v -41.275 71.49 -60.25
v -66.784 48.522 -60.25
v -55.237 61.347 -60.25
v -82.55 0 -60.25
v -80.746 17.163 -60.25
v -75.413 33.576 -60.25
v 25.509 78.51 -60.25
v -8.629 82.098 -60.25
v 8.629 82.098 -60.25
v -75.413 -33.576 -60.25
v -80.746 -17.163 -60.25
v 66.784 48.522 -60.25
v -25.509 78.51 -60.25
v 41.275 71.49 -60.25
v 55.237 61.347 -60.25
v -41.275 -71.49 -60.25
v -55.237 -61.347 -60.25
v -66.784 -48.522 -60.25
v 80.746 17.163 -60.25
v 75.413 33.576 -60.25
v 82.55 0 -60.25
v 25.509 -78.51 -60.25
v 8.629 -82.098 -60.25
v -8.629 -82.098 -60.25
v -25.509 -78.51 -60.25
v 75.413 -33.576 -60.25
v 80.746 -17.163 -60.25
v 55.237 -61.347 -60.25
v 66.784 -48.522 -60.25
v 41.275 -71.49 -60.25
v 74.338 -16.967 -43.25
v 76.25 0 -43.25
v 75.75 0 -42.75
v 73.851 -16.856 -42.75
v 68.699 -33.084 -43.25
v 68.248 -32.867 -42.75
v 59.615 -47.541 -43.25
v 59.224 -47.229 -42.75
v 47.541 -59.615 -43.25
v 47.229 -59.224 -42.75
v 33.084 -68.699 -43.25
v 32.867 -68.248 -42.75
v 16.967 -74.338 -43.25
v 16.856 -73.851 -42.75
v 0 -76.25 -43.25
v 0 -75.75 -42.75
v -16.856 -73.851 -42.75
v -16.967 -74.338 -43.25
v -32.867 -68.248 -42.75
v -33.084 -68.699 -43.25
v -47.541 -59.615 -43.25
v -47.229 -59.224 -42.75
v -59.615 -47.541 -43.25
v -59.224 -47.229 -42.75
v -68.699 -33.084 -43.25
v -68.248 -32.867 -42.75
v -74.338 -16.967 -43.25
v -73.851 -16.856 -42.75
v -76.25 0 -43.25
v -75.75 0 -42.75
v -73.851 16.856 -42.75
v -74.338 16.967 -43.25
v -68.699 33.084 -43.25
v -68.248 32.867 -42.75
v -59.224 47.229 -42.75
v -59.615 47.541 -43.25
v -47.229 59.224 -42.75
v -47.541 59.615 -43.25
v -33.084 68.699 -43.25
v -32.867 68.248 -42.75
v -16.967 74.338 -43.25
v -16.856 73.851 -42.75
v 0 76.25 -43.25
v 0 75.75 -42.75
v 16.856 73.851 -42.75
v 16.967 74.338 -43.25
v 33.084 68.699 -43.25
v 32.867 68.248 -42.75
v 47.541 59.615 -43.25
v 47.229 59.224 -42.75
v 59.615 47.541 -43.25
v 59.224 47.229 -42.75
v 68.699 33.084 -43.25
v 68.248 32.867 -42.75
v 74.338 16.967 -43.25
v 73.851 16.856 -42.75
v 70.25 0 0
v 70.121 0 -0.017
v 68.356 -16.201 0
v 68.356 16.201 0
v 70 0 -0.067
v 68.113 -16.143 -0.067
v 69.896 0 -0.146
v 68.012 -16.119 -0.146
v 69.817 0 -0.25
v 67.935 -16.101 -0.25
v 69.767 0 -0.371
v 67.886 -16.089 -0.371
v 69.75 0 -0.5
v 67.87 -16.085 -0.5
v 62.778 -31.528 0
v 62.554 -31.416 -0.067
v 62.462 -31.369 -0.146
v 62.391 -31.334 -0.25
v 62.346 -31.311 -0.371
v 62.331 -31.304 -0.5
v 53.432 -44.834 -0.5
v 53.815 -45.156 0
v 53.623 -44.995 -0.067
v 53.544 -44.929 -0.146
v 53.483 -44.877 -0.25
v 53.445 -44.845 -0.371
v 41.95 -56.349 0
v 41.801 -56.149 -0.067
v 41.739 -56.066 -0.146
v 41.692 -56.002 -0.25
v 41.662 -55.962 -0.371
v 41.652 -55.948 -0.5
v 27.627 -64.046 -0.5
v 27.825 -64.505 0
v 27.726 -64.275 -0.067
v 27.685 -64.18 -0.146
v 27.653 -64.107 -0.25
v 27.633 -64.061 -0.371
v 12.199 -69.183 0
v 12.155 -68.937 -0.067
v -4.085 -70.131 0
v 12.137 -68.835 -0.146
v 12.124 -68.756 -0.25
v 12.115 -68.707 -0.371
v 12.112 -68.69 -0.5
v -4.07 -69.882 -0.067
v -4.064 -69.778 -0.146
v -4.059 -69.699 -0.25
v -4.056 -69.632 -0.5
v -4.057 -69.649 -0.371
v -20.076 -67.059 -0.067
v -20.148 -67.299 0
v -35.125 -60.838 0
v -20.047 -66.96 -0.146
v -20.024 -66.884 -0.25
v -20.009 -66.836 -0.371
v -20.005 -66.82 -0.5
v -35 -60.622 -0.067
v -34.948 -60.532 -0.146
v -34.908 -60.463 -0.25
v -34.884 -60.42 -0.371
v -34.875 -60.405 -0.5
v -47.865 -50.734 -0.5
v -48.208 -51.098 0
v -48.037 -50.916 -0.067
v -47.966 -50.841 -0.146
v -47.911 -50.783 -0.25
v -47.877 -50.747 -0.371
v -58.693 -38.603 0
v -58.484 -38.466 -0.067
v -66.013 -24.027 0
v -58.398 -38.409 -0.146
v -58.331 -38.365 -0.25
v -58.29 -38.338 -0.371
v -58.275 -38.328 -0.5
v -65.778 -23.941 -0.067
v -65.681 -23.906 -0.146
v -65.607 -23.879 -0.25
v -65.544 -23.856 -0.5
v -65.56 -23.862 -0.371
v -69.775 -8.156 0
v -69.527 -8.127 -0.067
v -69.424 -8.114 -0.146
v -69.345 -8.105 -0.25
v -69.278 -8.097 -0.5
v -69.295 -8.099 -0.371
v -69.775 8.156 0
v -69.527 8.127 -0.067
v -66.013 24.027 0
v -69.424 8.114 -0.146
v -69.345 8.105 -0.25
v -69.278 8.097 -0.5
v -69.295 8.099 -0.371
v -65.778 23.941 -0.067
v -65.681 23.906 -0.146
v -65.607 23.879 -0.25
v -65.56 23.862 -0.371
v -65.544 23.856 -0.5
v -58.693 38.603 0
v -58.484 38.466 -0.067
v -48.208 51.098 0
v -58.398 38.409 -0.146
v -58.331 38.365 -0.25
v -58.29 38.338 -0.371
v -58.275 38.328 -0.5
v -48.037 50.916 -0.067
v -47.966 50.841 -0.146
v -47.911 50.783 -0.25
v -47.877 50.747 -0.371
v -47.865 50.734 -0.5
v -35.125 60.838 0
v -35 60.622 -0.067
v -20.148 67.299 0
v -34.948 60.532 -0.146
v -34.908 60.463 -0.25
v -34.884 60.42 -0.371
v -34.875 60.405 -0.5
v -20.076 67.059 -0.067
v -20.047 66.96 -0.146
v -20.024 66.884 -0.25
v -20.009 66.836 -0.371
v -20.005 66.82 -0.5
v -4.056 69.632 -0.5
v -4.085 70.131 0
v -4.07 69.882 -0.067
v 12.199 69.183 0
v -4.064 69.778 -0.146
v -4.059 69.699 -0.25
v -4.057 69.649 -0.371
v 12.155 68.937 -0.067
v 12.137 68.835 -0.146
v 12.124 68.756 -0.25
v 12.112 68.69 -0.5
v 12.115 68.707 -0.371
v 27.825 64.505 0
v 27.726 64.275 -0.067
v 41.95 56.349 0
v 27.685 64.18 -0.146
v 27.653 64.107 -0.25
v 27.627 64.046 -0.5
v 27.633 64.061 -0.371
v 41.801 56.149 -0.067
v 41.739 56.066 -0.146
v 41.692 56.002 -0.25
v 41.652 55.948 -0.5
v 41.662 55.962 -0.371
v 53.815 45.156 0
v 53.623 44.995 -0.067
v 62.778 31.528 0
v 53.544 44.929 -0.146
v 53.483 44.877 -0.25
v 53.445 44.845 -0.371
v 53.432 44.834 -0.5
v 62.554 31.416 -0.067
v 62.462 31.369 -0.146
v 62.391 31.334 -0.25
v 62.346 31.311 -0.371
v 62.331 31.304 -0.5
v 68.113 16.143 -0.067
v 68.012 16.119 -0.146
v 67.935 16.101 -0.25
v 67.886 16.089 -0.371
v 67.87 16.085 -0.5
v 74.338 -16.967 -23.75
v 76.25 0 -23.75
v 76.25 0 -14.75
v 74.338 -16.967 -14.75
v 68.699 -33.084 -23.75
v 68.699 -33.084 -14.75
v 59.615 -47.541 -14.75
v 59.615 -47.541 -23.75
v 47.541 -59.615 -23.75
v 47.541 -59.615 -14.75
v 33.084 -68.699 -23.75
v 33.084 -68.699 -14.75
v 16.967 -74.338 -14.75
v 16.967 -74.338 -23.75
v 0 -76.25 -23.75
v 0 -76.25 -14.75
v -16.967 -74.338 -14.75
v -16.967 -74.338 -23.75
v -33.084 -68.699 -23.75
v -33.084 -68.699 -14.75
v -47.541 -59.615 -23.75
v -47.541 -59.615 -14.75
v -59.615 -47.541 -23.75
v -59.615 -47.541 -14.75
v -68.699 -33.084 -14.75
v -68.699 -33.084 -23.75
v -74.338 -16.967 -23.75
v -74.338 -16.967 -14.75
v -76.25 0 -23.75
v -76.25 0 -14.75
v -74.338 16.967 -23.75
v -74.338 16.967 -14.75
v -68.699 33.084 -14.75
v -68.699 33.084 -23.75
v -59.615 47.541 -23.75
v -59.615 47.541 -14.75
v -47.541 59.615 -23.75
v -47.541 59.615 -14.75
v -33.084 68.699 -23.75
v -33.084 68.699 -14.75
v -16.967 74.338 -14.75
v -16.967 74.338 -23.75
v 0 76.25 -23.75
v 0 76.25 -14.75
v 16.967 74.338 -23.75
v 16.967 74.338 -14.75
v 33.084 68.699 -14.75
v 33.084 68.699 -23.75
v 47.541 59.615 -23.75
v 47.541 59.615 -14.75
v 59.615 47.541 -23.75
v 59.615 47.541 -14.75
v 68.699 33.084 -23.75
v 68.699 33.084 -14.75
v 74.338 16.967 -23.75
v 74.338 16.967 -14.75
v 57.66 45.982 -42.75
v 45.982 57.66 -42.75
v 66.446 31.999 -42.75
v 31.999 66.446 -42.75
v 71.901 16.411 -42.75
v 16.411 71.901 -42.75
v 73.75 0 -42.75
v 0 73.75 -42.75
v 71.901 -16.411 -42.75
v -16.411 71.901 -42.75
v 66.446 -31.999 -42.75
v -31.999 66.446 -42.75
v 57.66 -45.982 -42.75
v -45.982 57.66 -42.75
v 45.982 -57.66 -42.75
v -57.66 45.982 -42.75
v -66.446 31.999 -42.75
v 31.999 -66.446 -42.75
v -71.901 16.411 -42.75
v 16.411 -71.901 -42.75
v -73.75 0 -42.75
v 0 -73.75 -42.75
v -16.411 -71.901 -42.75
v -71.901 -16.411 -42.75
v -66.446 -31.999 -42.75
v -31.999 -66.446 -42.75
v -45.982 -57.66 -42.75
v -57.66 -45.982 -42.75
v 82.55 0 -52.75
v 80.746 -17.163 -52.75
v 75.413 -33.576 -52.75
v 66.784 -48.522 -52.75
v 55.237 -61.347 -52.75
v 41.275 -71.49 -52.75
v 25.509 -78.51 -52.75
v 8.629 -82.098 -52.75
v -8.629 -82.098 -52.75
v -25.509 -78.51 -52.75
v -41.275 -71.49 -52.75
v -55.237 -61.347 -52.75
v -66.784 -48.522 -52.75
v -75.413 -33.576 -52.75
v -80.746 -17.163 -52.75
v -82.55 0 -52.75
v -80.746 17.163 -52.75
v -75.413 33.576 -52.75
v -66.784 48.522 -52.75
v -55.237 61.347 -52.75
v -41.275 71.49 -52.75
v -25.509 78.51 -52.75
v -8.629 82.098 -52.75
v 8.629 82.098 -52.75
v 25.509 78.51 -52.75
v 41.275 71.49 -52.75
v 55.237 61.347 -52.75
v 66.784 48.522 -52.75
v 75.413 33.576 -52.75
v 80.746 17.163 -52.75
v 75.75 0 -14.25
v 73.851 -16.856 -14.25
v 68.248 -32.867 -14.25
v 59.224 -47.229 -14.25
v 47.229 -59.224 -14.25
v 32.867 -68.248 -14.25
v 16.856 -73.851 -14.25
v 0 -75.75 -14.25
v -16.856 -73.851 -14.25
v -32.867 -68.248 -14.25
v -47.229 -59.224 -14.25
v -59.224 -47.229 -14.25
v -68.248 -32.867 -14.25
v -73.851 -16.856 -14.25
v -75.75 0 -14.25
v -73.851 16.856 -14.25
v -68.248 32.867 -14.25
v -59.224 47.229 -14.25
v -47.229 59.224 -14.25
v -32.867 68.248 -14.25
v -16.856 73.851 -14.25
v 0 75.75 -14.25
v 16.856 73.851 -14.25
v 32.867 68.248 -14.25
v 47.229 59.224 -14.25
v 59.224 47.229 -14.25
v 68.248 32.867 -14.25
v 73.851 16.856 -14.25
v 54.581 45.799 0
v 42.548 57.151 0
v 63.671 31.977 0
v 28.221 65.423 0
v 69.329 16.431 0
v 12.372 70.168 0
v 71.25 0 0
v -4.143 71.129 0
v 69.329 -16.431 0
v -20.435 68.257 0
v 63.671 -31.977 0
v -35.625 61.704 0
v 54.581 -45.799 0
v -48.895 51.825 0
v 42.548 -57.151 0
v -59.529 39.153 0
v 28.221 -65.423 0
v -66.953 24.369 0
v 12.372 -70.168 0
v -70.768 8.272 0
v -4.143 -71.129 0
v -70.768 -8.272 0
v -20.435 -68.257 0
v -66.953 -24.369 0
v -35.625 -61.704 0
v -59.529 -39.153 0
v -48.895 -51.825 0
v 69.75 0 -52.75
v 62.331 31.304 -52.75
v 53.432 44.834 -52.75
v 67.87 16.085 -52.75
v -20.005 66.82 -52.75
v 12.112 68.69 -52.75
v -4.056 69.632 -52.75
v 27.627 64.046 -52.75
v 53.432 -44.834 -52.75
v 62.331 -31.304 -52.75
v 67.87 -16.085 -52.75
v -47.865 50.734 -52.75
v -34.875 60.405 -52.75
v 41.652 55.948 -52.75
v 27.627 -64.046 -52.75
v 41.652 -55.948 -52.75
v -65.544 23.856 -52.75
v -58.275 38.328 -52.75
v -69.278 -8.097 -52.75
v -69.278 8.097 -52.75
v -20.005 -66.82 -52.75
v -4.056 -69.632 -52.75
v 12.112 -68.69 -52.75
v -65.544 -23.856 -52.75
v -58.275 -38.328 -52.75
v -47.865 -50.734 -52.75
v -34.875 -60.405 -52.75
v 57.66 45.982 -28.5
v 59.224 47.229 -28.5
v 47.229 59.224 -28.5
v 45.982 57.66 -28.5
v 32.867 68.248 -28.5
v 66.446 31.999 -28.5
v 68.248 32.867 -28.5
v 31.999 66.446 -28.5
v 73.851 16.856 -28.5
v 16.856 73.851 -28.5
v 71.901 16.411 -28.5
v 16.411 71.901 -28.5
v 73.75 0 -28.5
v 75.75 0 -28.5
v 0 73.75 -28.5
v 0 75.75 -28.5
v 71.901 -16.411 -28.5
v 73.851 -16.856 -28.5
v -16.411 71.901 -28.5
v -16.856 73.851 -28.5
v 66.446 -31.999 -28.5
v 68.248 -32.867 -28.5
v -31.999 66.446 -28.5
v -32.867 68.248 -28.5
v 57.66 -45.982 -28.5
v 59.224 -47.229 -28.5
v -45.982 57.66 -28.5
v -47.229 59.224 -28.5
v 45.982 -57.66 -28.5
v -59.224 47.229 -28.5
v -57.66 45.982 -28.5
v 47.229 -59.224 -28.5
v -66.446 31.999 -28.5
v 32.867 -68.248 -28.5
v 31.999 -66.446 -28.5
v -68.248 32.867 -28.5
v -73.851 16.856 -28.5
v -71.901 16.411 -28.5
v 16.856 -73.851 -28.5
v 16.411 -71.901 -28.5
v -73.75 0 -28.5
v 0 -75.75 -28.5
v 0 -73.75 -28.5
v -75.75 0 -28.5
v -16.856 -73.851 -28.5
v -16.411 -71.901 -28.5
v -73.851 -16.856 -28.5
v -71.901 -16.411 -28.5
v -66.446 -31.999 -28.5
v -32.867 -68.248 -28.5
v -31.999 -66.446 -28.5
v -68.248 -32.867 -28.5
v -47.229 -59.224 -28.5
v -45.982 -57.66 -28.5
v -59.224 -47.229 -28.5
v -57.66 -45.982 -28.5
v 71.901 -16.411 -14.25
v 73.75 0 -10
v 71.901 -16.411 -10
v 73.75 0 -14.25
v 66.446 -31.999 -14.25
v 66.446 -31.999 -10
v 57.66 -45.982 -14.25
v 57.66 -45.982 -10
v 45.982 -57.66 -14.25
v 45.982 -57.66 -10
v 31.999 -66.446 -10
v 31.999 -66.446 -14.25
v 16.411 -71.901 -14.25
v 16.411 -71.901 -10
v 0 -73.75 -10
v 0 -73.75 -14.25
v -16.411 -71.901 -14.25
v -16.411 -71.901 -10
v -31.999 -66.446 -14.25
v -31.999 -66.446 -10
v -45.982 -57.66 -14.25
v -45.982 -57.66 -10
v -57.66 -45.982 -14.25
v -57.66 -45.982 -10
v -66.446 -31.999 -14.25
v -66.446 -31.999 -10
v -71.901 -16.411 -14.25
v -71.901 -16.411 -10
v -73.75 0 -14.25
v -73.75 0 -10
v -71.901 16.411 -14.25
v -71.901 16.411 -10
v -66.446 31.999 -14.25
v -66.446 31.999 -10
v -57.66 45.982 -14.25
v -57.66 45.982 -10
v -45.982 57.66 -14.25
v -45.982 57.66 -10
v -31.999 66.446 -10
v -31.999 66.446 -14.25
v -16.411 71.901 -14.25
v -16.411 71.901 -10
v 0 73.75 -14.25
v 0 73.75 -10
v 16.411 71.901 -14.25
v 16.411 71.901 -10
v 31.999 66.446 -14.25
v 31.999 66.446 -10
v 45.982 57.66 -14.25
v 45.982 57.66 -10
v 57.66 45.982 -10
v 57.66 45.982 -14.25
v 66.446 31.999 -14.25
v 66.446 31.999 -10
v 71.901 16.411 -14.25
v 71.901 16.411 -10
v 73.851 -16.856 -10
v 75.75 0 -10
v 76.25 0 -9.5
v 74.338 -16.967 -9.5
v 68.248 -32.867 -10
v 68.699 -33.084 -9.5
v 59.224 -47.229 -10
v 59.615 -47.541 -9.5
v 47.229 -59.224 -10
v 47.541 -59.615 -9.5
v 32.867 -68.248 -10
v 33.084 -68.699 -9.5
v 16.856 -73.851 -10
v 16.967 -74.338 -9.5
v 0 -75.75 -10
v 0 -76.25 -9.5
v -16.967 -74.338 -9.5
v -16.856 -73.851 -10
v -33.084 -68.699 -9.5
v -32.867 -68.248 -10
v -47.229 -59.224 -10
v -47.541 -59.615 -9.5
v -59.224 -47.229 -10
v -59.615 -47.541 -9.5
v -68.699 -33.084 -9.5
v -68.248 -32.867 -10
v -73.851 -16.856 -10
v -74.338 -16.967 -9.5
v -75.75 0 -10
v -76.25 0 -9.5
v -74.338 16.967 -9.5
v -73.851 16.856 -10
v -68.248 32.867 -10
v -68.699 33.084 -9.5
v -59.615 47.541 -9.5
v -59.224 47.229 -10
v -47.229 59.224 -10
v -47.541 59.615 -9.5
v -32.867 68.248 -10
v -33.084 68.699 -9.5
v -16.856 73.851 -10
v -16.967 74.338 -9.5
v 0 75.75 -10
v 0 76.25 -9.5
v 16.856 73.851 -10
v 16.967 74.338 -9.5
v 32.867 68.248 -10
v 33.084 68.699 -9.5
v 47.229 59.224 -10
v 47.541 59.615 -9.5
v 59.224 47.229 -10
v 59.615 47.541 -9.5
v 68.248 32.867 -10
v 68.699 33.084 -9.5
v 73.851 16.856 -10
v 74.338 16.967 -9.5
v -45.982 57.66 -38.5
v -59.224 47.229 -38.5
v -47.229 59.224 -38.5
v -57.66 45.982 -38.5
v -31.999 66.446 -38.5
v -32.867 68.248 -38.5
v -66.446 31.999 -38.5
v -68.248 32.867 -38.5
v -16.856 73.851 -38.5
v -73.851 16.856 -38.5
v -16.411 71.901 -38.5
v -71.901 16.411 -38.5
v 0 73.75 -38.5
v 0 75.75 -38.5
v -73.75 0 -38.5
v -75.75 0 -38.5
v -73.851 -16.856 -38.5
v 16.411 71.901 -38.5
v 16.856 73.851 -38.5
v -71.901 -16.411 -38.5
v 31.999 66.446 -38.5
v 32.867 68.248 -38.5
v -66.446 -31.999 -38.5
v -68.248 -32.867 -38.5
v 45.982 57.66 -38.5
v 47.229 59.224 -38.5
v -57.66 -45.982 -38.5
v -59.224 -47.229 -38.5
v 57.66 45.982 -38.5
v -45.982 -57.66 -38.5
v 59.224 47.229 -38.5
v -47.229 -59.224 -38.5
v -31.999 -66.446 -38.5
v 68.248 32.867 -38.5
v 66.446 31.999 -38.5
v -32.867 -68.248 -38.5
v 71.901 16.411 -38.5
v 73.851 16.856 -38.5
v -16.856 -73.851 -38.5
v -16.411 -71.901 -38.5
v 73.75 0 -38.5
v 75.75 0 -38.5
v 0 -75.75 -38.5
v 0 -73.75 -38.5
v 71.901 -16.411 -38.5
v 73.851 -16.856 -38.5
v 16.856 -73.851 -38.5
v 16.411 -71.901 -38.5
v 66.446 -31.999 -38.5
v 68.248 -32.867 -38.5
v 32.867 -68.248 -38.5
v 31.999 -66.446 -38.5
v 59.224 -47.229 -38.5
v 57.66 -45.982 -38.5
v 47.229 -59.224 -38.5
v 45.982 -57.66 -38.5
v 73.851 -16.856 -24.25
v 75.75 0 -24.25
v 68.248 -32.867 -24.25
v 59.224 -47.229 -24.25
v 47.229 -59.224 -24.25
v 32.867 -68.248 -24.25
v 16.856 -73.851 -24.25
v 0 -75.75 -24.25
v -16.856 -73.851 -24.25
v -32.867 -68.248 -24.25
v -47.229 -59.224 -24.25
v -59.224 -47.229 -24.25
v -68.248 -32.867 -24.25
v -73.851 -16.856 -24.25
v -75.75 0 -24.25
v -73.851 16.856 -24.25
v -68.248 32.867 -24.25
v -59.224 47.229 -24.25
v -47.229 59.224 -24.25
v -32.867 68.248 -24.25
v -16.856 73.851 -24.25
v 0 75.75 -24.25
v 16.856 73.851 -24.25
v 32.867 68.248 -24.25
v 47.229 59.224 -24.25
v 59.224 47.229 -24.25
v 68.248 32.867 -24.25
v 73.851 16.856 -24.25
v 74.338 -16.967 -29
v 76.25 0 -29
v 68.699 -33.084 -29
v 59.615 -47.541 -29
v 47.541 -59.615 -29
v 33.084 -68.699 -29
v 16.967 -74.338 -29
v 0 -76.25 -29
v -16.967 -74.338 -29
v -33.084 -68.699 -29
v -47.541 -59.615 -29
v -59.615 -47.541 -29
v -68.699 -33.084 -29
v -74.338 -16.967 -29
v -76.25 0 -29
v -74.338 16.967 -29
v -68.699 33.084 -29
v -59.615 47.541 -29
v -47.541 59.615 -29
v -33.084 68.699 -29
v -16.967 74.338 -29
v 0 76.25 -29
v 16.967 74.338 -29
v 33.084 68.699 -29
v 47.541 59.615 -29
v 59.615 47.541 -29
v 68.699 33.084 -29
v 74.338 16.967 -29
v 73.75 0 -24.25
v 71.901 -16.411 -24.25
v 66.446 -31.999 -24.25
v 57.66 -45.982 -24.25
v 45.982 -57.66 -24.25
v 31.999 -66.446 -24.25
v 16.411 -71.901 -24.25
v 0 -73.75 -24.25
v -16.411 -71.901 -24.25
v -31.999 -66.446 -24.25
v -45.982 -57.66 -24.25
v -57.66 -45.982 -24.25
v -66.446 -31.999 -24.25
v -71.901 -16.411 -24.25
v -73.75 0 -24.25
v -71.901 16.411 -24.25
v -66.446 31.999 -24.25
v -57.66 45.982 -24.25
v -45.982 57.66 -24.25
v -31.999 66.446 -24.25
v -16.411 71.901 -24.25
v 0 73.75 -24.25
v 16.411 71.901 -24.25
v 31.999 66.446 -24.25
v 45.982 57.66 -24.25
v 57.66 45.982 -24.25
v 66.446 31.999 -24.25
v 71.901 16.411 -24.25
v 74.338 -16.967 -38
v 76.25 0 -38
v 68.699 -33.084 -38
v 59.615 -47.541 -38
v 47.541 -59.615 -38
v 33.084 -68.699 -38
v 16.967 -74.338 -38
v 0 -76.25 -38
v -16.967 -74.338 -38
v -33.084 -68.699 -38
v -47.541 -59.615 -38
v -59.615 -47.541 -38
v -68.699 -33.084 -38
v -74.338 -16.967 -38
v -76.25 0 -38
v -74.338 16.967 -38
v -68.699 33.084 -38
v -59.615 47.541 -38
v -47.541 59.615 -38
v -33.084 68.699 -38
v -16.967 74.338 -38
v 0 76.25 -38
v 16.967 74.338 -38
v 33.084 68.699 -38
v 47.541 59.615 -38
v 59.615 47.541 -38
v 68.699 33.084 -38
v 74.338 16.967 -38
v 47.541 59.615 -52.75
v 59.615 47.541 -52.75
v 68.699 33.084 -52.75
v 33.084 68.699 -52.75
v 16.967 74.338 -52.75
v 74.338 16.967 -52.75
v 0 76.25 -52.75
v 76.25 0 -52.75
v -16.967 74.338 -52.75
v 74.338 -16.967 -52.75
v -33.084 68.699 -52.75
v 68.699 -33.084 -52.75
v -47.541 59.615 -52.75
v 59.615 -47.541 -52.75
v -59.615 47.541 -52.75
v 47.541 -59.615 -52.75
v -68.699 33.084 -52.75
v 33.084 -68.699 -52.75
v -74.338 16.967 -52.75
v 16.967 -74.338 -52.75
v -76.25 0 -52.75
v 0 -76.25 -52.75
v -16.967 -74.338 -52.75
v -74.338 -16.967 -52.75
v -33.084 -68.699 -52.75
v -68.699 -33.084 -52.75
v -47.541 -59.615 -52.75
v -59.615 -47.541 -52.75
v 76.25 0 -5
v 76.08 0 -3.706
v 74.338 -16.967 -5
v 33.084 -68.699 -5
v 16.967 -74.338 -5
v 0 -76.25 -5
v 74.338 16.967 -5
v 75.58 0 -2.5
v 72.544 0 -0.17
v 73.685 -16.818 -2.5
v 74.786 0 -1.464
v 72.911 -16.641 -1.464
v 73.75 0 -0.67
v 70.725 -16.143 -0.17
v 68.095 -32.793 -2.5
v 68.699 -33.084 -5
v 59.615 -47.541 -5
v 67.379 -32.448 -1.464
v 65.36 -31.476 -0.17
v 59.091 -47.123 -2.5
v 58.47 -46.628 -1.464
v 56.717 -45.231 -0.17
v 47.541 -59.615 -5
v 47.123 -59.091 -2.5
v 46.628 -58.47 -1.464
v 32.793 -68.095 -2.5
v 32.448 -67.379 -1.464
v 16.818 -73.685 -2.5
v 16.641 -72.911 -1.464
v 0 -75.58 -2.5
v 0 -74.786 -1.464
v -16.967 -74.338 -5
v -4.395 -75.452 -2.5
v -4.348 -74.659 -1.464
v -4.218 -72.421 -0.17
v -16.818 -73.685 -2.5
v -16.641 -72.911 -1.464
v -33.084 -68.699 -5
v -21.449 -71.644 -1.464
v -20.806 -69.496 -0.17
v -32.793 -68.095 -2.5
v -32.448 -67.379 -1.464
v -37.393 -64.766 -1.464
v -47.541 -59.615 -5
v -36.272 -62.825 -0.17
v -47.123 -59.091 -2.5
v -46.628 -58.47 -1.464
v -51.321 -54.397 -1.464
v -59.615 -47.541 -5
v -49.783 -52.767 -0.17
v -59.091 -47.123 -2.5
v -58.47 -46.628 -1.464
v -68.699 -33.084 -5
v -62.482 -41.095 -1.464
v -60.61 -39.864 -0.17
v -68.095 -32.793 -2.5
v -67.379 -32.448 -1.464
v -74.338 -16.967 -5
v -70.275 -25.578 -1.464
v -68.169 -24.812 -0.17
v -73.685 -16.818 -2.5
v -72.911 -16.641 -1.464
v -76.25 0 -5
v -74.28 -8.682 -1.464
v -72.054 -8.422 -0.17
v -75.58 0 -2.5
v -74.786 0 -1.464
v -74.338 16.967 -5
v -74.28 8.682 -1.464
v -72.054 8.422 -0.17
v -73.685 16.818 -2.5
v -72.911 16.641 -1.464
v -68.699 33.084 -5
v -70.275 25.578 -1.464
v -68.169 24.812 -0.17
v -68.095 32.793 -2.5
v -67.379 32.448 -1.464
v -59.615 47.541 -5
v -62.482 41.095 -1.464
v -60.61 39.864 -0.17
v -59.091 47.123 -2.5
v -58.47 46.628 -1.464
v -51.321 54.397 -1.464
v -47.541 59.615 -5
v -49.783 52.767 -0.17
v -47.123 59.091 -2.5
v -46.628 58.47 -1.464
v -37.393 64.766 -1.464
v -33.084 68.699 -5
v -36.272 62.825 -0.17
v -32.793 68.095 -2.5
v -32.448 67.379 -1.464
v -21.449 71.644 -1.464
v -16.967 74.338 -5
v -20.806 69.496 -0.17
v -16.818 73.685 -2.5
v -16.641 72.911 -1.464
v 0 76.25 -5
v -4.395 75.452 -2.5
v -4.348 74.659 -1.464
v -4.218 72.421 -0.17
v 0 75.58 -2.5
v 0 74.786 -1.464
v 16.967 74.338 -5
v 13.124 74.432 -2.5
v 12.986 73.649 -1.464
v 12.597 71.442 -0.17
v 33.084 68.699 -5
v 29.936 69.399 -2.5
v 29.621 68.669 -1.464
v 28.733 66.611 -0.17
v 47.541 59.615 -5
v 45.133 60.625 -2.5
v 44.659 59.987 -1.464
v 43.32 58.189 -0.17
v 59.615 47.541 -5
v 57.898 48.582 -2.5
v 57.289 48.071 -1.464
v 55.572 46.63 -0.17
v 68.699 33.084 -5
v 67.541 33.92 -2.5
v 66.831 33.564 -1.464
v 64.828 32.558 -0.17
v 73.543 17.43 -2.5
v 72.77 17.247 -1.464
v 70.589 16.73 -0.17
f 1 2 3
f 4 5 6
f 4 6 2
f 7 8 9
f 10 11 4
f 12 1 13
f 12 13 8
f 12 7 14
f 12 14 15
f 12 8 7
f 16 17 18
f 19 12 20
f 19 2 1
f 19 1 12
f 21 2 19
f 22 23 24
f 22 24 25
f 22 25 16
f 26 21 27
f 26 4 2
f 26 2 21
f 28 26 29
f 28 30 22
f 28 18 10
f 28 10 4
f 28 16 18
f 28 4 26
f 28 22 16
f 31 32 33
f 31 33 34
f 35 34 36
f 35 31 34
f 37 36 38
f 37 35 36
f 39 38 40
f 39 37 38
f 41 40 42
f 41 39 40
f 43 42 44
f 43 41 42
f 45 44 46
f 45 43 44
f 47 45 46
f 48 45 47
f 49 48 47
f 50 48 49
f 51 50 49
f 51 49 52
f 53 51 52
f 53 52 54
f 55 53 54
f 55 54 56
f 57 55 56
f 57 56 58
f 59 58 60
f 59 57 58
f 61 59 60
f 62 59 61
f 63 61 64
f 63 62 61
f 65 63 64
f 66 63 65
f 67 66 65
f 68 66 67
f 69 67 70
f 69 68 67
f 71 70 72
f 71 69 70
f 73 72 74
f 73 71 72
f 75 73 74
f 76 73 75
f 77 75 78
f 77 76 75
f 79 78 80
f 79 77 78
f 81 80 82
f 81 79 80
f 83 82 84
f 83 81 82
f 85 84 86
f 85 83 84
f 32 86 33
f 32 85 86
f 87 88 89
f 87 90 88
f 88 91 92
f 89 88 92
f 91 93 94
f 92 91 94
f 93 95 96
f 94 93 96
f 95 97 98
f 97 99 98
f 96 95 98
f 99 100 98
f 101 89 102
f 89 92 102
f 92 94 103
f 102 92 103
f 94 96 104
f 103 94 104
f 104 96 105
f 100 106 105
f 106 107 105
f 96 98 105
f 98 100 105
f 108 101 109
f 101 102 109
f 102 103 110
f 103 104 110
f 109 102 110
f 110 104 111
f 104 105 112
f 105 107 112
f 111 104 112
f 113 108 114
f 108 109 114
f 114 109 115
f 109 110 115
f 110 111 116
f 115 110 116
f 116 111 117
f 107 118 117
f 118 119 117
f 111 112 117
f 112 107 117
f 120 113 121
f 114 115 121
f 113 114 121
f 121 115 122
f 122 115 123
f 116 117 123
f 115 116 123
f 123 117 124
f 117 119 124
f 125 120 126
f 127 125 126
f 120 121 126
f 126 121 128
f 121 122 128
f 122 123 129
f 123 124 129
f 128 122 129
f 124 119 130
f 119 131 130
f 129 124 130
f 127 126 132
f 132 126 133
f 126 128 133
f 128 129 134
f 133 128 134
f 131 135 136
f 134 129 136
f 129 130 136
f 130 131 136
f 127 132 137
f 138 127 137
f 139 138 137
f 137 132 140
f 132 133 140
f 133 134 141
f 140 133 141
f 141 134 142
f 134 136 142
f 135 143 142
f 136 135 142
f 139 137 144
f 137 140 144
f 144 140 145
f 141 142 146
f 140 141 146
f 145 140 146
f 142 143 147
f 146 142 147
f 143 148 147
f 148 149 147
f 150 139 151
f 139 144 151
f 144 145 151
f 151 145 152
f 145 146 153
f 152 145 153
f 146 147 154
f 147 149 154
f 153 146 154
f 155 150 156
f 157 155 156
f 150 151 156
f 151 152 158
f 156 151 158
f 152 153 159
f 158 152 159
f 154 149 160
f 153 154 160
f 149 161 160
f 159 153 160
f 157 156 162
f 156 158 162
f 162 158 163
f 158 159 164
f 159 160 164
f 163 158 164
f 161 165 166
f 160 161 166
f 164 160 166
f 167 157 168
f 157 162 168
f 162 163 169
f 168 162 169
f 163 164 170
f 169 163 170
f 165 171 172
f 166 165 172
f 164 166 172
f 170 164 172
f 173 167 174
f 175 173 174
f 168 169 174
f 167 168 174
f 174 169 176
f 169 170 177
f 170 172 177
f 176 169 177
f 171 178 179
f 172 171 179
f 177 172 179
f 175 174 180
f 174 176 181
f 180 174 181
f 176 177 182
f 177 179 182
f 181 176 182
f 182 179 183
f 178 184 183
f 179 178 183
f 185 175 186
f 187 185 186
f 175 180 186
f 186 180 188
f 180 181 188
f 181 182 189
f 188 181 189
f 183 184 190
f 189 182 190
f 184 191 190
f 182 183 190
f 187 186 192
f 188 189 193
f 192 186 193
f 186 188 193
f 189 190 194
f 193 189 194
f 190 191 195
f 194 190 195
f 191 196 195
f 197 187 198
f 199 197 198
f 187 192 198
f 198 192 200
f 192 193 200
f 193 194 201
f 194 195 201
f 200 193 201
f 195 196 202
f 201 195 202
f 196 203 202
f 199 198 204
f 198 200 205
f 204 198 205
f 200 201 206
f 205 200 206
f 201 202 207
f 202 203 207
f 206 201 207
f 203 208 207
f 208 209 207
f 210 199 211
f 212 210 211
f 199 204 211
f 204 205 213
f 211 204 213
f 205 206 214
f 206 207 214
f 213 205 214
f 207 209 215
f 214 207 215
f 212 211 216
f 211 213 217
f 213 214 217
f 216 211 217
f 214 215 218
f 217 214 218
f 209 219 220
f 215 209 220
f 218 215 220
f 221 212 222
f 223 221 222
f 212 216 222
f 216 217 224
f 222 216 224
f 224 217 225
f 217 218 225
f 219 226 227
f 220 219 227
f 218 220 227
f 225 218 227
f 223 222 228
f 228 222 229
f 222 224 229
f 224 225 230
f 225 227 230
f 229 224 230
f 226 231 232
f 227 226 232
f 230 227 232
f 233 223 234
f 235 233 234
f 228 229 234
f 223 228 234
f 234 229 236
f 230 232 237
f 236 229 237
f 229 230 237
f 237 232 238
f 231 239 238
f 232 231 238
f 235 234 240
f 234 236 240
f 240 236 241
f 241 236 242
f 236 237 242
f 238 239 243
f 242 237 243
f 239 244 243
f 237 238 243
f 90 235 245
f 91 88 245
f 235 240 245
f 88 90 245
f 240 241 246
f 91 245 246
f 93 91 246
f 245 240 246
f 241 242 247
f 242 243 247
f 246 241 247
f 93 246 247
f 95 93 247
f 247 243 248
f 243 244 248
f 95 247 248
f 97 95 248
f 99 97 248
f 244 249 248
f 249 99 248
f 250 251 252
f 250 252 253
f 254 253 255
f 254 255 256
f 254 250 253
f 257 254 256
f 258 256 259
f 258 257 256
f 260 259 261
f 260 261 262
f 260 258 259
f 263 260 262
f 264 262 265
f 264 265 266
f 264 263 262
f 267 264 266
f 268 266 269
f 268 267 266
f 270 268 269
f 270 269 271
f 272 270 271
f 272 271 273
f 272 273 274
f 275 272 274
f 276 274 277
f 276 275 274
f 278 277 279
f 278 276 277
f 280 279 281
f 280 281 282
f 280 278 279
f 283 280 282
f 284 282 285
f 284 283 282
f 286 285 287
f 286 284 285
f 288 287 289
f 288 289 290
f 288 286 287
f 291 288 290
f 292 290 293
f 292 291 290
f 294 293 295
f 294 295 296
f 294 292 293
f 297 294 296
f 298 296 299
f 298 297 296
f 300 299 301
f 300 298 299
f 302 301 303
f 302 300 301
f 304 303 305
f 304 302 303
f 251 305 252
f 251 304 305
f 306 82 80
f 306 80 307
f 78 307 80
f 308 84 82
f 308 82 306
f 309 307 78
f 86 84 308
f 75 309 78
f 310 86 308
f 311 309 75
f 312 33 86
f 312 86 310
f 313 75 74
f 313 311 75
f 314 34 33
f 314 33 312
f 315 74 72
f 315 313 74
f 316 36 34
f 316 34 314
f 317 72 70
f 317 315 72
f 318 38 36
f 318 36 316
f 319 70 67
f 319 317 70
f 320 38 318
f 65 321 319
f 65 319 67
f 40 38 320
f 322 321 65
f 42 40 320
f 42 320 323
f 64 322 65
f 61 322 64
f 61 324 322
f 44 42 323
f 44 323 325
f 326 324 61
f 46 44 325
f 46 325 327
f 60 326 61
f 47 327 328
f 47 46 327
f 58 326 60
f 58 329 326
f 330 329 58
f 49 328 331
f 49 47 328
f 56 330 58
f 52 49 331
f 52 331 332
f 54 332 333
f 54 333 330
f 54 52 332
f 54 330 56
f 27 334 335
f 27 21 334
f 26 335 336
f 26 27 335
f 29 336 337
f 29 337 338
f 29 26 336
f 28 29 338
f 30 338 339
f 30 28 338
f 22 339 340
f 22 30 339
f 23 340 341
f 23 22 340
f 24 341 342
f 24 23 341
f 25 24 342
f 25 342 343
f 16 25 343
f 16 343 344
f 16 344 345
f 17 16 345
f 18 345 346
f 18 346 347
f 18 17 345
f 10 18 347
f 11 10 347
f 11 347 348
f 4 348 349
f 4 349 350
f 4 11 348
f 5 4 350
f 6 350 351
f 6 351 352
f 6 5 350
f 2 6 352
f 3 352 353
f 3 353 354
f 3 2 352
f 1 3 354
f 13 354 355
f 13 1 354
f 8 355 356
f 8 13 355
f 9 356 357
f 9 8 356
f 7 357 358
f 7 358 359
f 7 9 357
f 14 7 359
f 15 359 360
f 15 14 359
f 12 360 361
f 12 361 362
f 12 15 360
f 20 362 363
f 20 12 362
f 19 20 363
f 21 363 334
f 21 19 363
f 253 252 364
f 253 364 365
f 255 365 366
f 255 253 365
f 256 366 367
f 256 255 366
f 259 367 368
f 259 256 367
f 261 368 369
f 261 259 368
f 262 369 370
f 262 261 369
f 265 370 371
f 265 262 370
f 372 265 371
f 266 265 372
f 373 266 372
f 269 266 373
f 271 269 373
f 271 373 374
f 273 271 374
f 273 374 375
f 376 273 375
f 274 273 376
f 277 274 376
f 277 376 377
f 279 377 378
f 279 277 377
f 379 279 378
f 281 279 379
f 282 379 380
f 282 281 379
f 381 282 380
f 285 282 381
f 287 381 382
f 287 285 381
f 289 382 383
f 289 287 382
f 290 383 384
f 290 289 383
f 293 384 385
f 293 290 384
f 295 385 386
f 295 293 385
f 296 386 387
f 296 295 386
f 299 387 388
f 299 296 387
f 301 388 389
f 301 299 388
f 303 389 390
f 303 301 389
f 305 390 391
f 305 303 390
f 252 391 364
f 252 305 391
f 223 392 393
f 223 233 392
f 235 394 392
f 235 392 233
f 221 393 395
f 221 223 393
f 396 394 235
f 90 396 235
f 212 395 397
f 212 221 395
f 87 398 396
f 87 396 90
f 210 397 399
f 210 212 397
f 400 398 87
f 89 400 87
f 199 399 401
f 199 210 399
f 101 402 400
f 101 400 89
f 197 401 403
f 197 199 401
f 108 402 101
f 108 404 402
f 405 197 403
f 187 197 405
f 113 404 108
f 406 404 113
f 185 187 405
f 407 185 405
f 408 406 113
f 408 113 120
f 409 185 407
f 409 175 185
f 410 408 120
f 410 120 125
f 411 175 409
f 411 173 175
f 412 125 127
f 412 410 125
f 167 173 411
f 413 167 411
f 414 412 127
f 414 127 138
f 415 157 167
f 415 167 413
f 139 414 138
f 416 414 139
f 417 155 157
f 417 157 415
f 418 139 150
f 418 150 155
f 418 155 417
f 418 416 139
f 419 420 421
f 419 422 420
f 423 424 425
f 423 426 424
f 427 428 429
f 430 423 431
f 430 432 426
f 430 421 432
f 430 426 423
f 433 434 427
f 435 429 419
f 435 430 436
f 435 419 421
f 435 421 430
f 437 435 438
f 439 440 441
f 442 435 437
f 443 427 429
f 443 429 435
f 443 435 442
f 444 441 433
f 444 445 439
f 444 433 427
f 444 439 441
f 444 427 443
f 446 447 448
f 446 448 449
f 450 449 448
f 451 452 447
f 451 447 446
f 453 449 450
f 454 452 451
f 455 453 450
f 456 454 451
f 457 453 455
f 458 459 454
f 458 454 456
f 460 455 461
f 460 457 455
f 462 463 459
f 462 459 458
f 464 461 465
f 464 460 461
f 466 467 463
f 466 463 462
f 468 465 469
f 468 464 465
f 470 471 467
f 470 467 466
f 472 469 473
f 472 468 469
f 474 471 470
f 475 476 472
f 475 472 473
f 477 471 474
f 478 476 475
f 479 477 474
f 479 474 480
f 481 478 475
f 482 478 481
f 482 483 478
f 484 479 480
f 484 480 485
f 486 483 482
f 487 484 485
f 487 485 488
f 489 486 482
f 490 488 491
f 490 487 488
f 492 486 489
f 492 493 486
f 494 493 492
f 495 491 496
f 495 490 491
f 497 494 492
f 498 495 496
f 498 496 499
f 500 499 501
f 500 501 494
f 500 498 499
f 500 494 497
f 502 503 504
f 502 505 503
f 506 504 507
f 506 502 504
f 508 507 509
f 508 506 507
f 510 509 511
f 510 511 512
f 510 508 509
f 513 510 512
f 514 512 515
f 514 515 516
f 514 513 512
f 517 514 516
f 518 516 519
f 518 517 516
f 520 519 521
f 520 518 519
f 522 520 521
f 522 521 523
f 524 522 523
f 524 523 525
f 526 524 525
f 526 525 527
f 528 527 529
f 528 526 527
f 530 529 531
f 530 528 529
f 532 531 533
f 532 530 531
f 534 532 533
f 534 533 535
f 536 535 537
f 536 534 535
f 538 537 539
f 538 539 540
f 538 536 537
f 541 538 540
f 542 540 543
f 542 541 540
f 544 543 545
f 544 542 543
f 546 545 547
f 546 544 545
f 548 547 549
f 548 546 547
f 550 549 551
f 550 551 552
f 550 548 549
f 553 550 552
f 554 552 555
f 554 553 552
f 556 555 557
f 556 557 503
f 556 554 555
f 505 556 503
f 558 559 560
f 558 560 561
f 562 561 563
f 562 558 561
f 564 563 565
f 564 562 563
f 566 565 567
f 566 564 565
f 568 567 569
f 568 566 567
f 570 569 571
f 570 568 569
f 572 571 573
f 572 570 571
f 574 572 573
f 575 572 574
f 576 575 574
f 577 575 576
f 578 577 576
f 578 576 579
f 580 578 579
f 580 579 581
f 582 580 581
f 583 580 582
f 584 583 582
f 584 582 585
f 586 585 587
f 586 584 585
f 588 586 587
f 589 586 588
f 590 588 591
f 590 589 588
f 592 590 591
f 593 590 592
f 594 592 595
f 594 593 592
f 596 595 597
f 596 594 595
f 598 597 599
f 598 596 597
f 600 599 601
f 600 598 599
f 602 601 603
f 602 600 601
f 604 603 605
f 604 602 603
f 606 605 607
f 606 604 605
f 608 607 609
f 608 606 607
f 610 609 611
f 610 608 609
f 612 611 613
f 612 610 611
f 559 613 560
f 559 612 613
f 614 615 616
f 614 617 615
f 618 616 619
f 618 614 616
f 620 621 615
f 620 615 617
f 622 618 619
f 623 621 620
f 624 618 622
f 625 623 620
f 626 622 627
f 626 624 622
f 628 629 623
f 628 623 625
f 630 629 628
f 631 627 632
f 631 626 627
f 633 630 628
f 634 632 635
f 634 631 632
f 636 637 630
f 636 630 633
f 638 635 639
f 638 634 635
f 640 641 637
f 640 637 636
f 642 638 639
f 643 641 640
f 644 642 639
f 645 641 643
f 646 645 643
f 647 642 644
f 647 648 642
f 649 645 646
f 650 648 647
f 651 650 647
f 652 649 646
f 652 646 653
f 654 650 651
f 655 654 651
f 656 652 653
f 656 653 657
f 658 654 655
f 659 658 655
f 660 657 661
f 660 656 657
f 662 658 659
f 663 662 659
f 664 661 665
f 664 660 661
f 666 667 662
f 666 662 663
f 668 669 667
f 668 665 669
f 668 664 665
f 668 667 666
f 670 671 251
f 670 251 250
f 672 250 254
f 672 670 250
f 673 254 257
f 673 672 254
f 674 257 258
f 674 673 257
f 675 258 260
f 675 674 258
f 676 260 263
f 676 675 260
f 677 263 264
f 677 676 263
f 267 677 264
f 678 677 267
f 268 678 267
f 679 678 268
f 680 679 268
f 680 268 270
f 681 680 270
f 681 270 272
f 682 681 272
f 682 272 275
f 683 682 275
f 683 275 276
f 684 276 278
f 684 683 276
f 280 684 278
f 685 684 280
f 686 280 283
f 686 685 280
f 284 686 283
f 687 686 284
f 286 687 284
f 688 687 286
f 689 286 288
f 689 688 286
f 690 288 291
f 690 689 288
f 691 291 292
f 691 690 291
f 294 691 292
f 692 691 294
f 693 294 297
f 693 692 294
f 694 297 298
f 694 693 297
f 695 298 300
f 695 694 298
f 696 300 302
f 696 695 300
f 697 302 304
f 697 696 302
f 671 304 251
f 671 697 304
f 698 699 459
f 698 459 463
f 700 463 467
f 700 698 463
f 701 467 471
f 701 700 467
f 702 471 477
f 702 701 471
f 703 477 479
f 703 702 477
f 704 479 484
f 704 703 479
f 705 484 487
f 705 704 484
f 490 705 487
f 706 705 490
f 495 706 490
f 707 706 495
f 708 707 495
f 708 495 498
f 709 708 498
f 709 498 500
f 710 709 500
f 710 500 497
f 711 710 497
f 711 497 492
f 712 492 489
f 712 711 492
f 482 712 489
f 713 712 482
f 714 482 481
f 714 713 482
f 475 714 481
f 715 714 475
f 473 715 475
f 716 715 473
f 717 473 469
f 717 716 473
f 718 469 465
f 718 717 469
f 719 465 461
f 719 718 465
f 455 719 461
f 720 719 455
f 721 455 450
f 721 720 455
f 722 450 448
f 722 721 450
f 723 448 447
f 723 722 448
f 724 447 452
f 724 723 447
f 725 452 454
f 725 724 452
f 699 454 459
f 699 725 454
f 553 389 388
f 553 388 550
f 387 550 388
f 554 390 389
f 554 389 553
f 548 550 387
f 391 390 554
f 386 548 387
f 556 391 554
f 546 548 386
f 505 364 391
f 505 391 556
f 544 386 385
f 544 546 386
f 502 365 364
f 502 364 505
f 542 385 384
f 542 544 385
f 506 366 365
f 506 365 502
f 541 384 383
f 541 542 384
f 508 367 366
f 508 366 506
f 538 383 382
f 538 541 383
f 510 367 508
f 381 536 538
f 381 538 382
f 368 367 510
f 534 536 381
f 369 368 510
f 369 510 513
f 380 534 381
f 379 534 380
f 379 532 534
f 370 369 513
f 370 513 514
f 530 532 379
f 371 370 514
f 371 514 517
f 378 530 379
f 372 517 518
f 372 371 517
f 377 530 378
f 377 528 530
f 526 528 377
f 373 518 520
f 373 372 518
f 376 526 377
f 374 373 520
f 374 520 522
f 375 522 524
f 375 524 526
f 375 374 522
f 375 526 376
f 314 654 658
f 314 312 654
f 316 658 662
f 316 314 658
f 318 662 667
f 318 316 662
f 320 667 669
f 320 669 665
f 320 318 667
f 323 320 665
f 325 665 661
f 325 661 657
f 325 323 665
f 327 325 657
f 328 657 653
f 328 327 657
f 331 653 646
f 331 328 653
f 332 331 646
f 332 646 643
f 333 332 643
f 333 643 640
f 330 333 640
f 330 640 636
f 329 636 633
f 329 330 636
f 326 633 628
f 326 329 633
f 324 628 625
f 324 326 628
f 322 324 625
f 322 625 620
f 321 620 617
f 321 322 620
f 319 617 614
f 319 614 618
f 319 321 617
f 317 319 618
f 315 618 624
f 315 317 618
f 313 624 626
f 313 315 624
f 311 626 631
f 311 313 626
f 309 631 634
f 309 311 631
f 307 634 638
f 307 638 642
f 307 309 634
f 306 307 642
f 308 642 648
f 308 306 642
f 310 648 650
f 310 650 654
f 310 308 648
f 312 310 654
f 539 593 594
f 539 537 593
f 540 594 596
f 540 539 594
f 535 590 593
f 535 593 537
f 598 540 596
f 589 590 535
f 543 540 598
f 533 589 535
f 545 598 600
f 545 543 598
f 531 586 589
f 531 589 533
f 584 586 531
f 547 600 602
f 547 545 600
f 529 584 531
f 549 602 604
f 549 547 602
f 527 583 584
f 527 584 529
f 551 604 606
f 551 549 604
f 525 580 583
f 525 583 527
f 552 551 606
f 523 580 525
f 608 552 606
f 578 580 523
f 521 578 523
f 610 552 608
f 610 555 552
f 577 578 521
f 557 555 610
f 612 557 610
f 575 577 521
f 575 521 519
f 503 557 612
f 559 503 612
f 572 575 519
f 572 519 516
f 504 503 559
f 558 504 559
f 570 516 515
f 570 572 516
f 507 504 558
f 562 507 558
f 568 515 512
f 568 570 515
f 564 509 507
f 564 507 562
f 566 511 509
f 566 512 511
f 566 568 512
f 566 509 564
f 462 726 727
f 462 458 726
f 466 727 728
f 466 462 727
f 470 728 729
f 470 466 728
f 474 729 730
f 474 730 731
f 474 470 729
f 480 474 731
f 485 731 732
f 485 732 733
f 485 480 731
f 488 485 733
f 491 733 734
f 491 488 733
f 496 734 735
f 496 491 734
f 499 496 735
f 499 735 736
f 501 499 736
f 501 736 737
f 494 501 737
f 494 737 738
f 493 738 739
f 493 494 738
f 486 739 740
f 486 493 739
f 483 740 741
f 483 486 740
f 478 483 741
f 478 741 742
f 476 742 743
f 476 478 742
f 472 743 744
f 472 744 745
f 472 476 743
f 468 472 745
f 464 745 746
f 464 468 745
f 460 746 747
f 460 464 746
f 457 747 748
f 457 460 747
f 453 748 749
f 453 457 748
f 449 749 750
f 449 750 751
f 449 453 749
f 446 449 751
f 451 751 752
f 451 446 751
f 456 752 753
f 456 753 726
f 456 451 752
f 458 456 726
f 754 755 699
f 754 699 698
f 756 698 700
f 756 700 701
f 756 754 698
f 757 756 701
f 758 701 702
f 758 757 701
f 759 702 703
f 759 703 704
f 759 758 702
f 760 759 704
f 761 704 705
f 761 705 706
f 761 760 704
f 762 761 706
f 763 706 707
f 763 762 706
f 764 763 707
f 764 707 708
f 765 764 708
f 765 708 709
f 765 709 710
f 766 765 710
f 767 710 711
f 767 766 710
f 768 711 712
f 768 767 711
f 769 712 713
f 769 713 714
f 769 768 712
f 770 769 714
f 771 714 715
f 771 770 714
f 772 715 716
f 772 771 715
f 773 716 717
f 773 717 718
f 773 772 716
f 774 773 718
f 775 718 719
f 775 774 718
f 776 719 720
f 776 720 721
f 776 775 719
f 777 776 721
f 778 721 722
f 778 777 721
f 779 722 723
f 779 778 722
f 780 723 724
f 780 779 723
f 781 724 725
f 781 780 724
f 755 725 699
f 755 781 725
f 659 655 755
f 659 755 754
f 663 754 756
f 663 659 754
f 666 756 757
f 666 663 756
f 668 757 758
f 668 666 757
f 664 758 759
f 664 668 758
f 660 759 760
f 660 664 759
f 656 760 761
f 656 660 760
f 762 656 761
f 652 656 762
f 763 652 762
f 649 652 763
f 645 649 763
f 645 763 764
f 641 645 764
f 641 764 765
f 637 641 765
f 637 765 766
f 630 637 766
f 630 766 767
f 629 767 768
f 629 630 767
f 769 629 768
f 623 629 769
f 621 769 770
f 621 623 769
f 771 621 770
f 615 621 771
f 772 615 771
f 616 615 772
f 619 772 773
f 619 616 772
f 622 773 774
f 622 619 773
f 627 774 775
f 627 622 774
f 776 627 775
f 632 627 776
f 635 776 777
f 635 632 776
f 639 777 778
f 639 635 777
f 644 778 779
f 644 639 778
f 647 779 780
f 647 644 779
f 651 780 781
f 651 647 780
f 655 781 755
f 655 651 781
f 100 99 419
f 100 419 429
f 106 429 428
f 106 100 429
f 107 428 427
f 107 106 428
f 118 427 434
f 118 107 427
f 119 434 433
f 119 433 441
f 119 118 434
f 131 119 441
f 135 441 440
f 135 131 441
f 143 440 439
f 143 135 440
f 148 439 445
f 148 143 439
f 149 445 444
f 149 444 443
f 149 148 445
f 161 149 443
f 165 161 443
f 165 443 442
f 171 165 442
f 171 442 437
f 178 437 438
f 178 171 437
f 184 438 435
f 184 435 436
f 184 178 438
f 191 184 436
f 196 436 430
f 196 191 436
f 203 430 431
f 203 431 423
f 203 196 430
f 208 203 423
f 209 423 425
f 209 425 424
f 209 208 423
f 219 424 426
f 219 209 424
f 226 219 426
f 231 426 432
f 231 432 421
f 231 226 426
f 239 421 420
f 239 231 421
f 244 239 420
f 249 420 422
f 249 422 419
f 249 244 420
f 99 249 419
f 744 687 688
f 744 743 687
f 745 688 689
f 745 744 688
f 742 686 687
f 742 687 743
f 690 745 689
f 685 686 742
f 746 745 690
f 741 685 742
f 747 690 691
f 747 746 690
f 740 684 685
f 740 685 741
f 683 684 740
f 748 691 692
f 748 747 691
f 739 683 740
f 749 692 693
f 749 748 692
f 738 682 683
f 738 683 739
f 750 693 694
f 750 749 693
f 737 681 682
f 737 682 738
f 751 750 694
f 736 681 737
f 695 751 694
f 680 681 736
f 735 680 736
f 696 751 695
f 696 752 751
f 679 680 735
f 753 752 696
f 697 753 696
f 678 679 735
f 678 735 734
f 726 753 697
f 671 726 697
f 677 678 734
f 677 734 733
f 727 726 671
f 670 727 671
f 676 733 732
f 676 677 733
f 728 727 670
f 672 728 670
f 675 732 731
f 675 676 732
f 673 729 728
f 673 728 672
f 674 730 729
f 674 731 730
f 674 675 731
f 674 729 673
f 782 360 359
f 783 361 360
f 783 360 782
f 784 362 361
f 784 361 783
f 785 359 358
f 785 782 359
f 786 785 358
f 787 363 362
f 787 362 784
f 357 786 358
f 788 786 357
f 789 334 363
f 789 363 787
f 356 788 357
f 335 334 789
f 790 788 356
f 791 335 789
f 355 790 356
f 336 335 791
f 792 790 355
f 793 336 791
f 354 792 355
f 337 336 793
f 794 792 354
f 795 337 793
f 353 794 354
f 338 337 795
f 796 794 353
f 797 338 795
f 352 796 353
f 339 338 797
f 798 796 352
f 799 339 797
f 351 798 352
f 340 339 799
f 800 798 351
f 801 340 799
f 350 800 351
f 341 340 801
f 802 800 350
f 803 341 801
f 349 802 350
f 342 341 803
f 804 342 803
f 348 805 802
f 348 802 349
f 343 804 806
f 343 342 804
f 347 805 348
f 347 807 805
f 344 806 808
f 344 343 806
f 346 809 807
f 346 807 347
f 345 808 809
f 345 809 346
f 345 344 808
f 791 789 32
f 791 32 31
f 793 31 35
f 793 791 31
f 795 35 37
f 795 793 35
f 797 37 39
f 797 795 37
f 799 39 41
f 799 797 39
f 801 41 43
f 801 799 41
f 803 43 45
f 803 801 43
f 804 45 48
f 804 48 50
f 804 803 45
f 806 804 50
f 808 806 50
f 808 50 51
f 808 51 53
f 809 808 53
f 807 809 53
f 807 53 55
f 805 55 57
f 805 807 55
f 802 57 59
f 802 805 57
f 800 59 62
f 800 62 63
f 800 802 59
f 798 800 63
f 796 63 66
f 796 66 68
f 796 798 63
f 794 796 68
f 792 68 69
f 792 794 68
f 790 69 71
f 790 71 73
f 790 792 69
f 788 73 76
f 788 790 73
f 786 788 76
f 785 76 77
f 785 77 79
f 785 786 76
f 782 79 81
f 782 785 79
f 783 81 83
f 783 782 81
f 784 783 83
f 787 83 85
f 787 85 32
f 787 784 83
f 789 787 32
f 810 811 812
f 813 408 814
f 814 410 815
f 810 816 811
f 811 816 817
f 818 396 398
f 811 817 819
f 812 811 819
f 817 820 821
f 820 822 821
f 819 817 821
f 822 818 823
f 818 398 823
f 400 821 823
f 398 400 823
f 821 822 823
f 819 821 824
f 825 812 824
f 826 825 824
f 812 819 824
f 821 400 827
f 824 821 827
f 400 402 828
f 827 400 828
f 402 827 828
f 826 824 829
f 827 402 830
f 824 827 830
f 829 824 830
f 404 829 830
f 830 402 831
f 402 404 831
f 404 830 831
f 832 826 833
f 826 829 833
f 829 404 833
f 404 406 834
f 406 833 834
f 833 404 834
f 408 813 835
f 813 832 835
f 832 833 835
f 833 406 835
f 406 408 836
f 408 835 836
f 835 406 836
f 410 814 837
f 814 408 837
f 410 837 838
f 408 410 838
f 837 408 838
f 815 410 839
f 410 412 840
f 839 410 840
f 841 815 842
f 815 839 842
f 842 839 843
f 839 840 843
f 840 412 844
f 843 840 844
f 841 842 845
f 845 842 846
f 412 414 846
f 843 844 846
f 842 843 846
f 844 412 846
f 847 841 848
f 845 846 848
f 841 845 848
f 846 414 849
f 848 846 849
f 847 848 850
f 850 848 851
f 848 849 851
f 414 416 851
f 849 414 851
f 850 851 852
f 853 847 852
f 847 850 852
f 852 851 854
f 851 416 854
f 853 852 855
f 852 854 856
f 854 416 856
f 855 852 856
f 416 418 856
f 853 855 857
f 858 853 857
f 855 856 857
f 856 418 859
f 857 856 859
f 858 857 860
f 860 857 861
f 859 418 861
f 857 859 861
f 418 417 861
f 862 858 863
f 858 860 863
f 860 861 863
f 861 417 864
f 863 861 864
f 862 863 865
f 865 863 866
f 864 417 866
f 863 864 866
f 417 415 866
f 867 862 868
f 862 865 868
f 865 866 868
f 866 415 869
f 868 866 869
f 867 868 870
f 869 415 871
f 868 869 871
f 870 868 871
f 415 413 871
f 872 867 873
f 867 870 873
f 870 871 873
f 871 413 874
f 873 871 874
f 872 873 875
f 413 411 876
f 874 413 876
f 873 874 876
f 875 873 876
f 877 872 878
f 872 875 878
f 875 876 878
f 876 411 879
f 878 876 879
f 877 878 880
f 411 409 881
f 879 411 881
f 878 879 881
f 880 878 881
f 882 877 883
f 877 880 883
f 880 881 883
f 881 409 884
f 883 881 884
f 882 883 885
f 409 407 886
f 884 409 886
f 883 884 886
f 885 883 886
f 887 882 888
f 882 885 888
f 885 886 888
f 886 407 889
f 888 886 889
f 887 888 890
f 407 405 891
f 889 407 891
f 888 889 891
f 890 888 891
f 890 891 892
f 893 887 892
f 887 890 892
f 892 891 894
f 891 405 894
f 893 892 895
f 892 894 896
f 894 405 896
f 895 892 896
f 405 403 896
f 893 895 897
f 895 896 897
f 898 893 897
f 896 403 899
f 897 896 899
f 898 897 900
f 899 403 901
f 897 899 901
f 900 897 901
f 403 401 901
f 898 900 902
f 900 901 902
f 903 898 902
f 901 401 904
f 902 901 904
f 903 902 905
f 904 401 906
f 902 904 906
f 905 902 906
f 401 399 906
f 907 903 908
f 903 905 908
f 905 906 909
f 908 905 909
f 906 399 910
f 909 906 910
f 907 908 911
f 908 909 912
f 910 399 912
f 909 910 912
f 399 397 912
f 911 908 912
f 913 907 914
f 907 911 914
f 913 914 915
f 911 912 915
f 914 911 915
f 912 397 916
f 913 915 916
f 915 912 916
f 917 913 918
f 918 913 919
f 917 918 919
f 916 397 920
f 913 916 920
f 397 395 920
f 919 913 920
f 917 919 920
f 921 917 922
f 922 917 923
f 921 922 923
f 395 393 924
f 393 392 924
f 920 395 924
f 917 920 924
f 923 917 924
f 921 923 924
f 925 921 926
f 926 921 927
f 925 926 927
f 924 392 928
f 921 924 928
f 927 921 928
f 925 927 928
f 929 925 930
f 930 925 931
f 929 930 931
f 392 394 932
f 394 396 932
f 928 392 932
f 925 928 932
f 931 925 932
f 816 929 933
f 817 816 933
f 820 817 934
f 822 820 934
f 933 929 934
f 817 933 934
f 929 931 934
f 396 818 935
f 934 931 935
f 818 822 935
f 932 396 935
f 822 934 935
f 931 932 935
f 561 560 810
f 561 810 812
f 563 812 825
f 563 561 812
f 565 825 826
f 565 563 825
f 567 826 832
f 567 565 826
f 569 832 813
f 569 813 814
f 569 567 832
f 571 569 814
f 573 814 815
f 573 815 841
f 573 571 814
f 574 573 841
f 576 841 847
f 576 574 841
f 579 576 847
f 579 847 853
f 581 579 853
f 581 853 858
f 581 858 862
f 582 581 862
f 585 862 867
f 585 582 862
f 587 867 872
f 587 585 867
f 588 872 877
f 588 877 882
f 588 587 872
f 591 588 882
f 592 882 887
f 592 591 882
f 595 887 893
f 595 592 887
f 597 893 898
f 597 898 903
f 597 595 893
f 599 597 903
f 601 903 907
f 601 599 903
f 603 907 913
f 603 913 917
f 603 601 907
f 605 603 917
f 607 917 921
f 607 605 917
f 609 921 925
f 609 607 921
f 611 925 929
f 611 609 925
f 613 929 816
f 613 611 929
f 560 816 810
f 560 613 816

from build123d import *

# Parameters (mm, degrees)
CHAMFER1_SIZE = 0.5
FILLET1_R     = 5
FILLET2_R     = 0.5


with BuildPart() as part:
    # Sketch1 → Revolve1 (revolve)
    with BuildSketch(Plane(origin=(0, 0, 0), x_dir=(1, 0, 0), z_dir=(0, 1, 0))):
        Polygon((69.75, 0), (76.25, 0), (76.25, 10), (73.75, 10), (73.75, 14.25), (76.25, 14.25), (76.25, 24.25), (73.75, 24.25), (73.75, 28.5), (76.25, 28.5), (76.25, 38.5), (73.75, 38.5), (73.75, 42.75), (76.25, 42.75), (76.25, 52.75), (82.55, 52.75), (82.55, 60.25), (0, 60.25), (0, 52.75), (69.75, 52.75), align=None)
    revolve(axis=Axis((0, 0, 0), (0, 0, -1)))

    # Chamfer1
    chamfer1_edges = [part.edges().sort_by_distance(p)[0] for p in [
        (-76.25, 0, -14.25),
        (-76.25, 0, -24.25),
        (-76.25, 0, -28.5),
        (-76.25, 0, -38.5),
        (-76.25, 0, -42.75),
        (-76.25, 0, -10),
    ]]
    chamfer(chamfer1_edges, length=CHAMFER1_SIZE)

    # Fillet1
    fillet1_edges = [part.edges().sort_by_distance(p)[0] for p in [
        (-76.25, 0, 0),
    ]]
    fillet(fillet1_edges, radius=FILLET1_R)

    # Fillet2
    fillet2_edges = [part.edges().sort_by_distance(p)[0] for p in [
        (-69.75, 0, 0),
    ]]
    fillet(fillet2_edges, radius=FILLET2_R)


solid = part.part
